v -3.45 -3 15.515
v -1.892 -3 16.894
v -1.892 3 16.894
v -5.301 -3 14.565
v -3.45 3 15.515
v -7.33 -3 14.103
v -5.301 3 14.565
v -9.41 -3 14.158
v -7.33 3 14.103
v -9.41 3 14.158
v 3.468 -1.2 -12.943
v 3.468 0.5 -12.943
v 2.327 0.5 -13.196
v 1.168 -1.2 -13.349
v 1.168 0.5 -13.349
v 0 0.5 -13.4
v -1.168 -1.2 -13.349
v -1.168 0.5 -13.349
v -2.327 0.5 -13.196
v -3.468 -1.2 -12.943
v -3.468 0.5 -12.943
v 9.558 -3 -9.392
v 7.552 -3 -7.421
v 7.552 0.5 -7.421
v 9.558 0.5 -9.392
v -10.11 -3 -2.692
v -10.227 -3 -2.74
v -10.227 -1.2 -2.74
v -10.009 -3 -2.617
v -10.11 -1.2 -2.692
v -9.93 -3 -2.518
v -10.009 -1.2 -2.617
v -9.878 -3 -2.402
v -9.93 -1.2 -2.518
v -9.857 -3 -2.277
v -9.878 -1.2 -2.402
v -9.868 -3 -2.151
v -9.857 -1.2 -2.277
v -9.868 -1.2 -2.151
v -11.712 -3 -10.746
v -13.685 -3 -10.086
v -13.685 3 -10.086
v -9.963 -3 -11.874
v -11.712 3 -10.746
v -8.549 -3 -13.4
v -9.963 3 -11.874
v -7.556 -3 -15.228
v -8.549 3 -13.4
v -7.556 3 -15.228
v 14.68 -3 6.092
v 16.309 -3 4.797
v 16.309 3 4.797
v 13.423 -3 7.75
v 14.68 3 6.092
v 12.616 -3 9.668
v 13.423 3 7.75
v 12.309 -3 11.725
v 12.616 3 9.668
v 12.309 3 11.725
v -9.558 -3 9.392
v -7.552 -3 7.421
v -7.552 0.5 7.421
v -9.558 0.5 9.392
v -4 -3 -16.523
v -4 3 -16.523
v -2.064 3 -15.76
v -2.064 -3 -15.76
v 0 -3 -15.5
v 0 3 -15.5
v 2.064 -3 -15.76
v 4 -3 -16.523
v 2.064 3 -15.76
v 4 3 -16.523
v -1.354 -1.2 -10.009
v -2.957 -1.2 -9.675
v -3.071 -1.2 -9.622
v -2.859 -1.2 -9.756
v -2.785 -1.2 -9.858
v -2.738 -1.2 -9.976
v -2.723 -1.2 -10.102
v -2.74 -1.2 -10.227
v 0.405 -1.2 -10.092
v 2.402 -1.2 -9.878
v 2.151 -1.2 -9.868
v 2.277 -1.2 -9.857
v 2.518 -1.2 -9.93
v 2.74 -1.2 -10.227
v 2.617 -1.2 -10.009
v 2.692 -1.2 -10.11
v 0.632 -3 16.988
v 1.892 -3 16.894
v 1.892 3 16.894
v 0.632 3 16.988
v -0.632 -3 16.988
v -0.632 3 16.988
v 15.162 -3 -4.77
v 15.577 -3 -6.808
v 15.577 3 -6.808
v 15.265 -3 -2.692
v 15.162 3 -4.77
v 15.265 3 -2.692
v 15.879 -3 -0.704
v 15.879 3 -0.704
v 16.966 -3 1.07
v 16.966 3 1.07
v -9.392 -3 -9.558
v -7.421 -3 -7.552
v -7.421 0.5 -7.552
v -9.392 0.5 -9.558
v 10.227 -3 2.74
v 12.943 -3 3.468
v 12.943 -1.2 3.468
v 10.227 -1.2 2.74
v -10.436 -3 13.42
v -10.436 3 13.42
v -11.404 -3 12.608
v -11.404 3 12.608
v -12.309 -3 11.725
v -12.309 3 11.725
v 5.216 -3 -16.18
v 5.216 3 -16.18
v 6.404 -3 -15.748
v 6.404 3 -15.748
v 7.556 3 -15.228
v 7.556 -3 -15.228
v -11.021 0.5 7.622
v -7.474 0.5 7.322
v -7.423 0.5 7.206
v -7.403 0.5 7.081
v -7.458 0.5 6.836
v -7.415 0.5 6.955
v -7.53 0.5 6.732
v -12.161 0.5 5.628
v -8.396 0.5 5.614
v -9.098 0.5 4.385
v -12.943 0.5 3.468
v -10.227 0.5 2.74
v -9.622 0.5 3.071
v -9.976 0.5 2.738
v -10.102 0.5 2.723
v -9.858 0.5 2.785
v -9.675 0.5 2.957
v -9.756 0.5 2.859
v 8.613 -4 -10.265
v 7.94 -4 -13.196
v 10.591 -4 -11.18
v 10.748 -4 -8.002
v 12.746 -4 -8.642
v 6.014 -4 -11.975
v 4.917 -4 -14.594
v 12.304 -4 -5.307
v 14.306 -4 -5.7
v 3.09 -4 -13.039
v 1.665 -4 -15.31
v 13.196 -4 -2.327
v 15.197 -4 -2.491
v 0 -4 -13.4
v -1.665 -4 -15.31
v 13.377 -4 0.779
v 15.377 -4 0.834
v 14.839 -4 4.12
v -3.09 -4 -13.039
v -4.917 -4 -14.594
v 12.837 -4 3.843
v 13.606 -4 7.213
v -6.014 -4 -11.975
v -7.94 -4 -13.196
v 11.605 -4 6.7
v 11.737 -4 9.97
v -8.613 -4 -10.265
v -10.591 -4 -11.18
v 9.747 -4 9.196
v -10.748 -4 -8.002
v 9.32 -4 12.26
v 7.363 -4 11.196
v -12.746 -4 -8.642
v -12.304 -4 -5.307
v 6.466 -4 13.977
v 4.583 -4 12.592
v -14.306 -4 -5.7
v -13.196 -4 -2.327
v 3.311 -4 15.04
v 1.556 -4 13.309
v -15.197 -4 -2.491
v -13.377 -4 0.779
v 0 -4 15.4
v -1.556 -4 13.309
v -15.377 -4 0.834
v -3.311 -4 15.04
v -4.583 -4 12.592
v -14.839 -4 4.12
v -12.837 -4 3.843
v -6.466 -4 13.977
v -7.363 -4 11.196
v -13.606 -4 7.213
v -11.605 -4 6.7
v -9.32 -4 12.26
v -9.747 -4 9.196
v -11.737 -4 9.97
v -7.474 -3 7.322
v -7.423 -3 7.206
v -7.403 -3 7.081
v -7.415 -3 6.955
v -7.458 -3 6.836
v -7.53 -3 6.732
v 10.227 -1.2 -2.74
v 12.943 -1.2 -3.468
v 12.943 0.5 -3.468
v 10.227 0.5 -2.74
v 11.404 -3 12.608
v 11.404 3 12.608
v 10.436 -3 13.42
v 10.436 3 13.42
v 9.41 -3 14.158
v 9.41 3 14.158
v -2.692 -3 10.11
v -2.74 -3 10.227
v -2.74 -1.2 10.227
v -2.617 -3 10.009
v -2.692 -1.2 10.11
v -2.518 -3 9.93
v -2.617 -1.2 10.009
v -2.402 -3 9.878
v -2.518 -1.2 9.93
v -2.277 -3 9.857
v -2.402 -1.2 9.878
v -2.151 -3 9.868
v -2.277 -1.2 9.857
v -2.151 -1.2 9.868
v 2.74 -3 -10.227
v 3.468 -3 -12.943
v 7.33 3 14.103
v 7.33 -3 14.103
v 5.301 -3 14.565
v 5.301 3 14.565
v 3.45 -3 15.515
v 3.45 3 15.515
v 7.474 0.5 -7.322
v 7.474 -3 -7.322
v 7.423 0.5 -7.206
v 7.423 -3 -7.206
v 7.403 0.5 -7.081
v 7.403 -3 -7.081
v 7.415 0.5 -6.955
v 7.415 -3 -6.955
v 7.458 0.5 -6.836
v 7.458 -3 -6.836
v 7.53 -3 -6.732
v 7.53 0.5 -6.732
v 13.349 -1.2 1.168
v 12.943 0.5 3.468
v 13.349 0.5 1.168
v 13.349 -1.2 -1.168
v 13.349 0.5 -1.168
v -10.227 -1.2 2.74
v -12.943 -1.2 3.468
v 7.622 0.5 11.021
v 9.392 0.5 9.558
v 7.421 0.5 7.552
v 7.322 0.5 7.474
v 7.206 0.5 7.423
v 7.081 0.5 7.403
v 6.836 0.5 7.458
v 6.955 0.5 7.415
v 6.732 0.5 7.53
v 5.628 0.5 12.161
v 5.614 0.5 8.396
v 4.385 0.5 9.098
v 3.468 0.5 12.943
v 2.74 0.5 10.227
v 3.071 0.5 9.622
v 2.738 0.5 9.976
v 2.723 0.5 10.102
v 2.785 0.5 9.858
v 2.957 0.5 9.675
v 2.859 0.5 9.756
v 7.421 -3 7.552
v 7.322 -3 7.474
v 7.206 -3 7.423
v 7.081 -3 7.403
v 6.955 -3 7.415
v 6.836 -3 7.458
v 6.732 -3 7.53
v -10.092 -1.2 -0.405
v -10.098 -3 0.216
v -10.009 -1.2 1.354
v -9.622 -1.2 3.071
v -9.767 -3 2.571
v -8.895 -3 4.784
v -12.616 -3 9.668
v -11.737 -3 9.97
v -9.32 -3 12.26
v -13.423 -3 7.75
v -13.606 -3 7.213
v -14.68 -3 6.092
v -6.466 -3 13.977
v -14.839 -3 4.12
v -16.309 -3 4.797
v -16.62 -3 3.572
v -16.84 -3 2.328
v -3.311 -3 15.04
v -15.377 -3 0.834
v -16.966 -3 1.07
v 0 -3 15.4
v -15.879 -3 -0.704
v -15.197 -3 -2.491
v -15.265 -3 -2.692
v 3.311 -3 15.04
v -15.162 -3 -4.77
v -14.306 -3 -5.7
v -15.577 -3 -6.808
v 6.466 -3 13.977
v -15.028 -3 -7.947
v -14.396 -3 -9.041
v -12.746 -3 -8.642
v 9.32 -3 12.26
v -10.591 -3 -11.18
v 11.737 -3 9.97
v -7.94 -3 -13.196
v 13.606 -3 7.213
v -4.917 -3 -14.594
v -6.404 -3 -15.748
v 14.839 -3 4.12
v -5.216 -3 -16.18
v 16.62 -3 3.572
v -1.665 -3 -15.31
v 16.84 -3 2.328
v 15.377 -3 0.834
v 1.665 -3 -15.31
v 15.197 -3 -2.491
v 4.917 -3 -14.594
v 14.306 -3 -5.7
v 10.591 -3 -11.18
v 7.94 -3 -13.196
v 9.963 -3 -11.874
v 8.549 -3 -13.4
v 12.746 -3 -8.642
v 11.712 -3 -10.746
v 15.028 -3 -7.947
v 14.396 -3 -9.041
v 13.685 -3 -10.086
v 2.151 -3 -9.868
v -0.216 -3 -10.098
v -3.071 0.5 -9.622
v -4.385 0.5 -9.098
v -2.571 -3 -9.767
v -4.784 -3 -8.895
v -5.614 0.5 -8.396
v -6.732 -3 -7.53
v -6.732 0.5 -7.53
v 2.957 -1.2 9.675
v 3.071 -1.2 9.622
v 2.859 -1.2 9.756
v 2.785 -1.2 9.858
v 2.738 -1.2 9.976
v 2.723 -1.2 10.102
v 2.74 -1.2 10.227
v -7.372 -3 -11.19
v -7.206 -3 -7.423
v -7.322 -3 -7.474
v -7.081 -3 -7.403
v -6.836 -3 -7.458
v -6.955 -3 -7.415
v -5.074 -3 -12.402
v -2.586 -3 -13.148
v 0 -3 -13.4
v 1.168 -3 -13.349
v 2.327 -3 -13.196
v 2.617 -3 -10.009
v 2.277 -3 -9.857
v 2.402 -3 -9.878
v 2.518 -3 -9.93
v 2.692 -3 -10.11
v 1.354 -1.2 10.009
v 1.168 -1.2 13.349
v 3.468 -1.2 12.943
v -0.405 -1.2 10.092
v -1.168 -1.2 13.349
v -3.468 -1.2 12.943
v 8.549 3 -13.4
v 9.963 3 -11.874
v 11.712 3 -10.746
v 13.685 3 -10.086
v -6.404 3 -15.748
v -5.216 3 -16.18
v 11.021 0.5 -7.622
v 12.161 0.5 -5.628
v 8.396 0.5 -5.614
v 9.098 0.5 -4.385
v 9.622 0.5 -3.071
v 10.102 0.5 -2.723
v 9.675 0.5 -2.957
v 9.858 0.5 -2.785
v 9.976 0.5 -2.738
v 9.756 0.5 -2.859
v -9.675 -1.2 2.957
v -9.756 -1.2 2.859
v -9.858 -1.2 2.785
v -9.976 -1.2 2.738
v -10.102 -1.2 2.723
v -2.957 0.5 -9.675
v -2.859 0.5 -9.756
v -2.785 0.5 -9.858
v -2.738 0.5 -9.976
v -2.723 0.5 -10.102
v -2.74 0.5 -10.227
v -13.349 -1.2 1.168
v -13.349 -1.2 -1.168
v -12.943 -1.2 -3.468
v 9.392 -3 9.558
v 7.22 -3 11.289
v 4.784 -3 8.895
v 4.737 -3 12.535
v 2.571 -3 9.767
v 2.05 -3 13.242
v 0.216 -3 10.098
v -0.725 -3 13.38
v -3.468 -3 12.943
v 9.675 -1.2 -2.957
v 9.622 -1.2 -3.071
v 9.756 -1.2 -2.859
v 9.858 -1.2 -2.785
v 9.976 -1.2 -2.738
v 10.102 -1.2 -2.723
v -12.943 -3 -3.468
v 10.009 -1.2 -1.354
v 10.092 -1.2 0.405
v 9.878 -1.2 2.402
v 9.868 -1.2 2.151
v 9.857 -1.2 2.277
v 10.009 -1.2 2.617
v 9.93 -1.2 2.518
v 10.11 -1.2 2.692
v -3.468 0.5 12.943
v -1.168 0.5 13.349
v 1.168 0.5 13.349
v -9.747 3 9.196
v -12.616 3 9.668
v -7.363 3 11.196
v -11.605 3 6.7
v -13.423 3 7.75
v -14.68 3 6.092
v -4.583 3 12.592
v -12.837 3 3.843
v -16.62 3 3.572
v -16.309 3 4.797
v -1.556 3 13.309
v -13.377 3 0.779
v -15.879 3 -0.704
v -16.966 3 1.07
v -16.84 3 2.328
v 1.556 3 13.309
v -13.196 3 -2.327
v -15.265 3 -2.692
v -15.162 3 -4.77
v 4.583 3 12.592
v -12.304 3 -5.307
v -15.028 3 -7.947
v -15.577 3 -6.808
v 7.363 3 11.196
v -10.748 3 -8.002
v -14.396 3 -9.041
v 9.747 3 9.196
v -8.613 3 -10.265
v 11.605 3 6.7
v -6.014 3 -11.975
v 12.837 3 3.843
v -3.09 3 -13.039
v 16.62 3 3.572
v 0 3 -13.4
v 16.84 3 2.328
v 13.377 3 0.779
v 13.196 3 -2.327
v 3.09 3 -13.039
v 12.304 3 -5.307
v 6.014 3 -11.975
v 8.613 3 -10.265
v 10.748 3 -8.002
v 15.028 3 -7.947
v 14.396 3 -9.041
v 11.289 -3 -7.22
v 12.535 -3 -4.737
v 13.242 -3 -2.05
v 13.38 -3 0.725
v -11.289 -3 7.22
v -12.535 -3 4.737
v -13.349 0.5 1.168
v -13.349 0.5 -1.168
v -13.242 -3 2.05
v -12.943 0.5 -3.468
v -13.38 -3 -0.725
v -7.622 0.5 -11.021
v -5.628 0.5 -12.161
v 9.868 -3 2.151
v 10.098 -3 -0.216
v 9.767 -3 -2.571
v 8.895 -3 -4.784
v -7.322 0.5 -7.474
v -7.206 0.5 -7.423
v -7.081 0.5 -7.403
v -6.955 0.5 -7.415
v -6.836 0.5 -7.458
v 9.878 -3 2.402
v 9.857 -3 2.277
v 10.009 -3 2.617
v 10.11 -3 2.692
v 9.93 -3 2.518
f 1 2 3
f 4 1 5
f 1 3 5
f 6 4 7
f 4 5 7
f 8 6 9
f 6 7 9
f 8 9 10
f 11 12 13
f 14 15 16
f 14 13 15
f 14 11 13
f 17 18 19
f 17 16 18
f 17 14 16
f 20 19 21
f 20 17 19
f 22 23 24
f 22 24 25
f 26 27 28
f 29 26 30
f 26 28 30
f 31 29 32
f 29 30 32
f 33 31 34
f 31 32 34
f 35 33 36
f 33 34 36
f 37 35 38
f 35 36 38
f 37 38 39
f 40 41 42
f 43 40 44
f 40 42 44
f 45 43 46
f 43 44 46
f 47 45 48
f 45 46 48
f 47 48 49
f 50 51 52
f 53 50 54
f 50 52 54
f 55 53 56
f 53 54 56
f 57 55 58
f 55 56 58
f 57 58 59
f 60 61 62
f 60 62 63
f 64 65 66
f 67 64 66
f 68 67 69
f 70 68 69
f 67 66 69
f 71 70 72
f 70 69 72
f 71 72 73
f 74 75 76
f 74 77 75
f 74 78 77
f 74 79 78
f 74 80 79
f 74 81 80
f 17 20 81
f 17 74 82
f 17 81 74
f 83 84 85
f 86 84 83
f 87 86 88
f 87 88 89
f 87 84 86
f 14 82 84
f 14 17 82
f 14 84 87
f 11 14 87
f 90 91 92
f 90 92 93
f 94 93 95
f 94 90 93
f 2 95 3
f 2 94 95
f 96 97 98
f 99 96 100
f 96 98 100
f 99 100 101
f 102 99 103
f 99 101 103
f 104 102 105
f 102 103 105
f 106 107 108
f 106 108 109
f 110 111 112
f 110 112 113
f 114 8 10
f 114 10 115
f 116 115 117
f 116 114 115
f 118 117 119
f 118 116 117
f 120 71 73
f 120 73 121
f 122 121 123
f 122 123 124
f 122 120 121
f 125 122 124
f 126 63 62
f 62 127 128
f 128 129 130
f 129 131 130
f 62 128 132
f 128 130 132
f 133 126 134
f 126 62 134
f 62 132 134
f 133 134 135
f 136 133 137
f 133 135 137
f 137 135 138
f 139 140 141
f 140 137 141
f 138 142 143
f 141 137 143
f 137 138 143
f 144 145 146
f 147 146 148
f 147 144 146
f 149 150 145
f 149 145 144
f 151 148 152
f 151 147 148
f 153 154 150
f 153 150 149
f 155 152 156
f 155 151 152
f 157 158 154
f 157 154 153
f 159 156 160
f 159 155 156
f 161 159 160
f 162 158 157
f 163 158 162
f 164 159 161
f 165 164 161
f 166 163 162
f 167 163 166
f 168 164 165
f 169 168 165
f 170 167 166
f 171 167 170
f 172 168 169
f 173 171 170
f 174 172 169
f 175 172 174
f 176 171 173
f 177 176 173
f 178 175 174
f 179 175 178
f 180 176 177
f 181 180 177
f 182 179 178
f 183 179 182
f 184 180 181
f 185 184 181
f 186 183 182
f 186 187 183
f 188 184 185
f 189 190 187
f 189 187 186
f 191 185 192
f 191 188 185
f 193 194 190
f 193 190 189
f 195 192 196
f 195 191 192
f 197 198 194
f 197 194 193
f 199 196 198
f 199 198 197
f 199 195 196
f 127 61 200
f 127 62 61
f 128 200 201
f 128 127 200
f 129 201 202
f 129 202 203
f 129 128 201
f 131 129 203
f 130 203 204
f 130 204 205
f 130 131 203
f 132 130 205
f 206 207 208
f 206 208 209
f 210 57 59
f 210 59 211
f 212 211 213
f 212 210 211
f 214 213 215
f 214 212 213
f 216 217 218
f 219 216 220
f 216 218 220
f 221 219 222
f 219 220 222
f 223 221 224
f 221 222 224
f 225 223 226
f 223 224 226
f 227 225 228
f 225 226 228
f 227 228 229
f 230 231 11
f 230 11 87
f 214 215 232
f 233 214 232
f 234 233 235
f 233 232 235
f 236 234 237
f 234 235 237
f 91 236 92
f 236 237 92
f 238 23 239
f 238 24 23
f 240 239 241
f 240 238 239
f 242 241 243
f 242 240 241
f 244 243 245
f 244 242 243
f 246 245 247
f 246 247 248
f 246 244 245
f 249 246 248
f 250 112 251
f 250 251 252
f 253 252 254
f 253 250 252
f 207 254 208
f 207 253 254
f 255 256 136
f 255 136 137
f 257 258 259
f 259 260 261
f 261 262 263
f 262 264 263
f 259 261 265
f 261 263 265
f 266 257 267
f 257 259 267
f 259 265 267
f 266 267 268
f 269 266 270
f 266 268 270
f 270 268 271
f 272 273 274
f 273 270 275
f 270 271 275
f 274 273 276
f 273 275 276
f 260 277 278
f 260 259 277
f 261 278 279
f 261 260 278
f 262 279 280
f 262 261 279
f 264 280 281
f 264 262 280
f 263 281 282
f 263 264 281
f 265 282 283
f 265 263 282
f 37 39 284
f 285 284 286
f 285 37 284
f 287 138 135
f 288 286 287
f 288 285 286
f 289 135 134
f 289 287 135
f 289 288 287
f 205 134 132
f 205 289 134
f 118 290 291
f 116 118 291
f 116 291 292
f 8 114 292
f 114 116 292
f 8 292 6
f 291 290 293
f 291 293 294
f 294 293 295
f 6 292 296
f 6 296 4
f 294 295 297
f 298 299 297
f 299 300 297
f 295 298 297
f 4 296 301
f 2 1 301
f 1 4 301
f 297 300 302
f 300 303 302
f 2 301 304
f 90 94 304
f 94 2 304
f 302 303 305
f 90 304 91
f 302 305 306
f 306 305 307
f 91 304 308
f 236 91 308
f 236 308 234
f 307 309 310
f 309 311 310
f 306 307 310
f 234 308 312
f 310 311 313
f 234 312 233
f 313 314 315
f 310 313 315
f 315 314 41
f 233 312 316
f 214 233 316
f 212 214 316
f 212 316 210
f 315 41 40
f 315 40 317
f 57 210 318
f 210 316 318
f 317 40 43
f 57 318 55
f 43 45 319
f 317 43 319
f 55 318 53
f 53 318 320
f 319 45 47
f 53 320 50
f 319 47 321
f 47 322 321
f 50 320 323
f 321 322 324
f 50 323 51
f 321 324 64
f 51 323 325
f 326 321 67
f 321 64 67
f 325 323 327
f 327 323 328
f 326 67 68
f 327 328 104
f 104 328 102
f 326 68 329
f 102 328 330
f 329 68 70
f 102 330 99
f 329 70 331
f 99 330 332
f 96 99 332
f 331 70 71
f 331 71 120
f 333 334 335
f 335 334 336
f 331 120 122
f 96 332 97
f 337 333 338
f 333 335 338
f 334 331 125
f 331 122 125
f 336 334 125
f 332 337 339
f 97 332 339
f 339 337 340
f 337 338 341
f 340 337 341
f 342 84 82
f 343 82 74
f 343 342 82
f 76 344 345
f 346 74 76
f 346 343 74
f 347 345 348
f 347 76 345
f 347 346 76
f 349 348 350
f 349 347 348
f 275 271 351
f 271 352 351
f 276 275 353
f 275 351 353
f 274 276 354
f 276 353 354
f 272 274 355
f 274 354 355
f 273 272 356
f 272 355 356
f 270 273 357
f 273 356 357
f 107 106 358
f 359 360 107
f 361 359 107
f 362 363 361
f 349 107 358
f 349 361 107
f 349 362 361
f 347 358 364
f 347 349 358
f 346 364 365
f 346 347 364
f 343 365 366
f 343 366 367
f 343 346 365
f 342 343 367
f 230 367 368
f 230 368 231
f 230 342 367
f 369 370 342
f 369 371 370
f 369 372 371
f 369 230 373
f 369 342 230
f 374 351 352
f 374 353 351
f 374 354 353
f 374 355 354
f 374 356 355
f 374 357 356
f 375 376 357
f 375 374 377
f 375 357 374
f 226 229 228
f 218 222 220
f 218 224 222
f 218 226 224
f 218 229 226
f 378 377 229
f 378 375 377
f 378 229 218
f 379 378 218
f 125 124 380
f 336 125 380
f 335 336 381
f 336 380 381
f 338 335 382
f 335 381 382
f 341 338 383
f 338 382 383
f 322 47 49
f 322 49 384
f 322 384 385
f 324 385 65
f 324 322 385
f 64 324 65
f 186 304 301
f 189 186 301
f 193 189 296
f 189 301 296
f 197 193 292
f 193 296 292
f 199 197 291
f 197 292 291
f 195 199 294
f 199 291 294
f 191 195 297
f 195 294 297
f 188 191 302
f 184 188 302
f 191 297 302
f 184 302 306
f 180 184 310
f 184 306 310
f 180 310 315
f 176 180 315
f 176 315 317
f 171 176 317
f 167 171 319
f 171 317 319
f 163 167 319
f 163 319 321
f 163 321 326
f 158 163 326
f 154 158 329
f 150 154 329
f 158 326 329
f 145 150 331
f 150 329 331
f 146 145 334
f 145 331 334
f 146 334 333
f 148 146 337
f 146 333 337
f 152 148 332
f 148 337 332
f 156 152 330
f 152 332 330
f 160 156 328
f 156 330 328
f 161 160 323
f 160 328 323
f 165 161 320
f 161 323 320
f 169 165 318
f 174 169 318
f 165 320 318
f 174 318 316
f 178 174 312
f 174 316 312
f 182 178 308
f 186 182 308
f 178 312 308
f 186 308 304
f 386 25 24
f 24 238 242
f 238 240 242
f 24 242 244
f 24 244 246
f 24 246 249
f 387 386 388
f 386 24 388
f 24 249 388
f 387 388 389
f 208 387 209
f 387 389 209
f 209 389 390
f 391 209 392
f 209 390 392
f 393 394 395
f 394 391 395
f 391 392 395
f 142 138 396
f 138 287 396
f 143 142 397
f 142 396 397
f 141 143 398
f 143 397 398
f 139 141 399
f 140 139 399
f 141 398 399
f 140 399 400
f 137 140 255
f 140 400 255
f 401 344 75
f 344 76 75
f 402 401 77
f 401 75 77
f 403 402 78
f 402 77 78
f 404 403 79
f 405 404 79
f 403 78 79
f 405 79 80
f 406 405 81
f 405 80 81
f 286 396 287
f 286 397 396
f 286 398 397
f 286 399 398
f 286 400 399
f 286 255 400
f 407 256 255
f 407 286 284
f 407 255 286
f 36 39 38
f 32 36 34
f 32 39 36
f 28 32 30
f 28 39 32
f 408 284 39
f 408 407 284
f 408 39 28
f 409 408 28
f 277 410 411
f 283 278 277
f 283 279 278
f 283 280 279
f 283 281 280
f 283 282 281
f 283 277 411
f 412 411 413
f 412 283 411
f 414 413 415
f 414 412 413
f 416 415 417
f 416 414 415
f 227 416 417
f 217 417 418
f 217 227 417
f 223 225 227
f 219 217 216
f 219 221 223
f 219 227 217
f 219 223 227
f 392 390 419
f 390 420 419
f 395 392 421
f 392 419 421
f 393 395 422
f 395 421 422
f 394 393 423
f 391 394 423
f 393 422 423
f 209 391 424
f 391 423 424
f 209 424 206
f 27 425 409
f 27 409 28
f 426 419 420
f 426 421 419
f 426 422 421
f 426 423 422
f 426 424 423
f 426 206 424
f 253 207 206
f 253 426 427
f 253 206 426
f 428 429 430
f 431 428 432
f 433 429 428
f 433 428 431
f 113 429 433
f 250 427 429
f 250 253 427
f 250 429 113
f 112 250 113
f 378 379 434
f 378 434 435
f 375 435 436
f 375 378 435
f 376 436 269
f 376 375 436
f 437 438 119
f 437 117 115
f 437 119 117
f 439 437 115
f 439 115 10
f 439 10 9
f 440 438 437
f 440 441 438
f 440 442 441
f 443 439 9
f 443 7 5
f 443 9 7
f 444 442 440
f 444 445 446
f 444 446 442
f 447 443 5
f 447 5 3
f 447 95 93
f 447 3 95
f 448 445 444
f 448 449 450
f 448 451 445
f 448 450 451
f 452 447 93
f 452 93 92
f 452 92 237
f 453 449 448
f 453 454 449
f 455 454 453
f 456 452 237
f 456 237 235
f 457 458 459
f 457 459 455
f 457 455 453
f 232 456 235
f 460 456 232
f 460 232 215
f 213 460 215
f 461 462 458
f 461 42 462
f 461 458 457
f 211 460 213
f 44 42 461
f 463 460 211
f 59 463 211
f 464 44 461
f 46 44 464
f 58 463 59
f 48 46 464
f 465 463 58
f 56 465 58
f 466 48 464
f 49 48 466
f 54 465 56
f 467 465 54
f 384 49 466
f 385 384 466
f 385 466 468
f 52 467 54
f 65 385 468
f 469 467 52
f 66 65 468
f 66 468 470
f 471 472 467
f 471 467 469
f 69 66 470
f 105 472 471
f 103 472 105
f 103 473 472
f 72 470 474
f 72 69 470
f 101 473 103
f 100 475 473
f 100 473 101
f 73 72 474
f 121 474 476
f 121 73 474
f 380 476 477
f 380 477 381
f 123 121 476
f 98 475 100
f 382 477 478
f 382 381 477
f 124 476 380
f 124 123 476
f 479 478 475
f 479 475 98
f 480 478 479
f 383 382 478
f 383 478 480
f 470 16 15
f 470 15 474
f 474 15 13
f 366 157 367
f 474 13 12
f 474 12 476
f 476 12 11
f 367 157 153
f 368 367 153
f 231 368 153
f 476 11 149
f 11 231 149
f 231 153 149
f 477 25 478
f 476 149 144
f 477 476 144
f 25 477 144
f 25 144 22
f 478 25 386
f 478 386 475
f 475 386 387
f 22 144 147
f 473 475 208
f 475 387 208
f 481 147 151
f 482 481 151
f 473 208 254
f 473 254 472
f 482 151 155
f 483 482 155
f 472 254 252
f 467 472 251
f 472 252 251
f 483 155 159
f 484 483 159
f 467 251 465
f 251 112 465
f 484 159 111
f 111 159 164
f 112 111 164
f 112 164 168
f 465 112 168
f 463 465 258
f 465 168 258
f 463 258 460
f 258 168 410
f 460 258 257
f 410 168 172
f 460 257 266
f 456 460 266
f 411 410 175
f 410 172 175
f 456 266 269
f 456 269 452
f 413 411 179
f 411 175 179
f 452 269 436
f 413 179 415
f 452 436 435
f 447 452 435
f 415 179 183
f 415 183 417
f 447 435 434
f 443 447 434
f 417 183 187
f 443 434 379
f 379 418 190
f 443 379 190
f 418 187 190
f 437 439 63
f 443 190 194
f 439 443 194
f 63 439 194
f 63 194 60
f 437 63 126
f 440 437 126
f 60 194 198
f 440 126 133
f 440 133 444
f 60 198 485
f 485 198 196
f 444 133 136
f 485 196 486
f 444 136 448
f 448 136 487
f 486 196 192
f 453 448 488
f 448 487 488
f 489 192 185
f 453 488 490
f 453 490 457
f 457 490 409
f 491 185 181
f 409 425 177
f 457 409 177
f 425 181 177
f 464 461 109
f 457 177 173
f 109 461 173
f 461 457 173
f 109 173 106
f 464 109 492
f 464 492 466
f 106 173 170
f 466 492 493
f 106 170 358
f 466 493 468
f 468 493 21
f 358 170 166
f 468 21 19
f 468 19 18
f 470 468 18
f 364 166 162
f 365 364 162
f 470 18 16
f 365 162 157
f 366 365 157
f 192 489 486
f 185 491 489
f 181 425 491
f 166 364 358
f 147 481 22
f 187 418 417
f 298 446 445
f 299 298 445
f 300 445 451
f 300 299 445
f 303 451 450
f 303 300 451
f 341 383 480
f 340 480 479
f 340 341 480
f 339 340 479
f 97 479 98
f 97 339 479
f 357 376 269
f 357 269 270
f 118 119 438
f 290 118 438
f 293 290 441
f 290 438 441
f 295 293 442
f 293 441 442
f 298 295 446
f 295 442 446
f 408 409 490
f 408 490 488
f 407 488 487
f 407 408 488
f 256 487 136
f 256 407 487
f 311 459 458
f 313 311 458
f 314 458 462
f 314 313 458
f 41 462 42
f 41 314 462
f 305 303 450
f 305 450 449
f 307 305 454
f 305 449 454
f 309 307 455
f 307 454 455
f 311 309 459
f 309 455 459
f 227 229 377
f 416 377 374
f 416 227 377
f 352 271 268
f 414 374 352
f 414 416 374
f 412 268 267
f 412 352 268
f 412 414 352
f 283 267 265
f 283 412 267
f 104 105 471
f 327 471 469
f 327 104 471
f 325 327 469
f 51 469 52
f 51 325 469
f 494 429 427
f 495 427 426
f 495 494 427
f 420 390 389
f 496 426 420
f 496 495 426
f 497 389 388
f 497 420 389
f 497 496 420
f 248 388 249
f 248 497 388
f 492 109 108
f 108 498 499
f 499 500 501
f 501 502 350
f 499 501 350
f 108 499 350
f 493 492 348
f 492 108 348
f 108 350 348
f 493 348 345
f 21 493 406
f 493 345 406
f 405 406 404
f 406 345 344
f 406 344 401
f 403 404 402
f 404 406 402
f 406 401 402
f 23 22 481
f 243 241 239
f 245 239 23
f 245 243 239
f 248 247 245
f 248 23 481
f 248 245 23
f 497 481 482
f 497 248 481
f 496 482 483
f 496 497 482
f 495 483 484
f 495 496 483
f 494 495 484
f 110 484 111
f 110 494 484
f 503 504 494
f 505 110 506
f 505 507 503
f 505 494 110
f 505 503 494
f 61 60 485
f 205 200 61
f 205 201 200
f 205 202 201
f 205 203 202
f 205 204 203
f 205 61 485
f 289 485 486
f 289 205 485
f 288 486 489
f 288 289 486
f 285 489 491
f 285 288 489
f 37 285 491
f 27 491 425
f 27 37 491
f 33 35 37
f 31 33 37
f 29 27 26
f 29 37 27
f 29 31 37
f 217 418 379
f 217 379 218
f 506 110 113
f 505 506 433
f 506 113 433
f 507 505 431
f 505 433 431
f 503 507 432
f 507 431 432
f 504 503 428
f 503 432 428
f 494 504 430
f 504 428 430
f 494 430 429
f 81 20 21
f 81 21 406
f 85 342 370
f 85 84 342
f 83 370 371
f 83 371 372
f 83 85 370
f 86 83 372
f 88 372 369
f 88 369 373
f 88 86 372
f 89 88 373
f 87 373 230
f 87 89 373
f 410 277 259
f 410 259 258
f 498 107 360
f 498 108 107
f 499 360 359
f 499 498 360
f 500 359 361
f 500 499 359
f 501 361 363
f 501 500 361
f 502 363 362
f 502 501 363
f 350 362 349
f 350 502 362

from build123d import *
from build123d.topology import SkipClean

# Parameters (mm, degrees)
EXTRUDE_1_DEPTH                  = 3
SKETCH_3_R                       = 15.4
EXTRUDE_2_DEPTH                  = 1
SKETCH_4_R                       = 13.4
CUT_EXTRUDE_1_DEPTH              = 68.538877693
EXTRUDE_3_DEPTH                  = 3.5
CUT_EXTRUDE_START                = -1.7
CUT_EXTRUDE_2_DEPTH              = 1.7
FILLET_1_R                       = 0.5
PATTERN_CIRCULAR_1_COUNT         = 4
FILLET_1_OF_PATTERN_CIRCULAR_1_R = 0.5
HOLE_WIZARD_M2_1_D               = 2.4
HOLE_WIZARD_M2_1_CBORE_D         = 5
HOLE_WIZARD_M2_1_CBORE_DEPTH     = 1.6
HOLE_WIZARD_M2_2_D               = 2.4
HOLE_WIZARD_M2_2_CBORE_D         = 5
HOLE_WIZARD_M2_2_CBORE_DEPTH     = 1.6
HOLE_WIZARD_M2_1_2_D             = 1.6
FILLET_2_R                       = 3
CUT_EXTRUDE_START_2              = -1.6
SKETCH_15_R                      = 2.5
CUT_EXTRUDE_4_DEPTH              = 1.6
SKETCH_16_W                      = 105
SKETCH_16_H                      = 105
SKETCH_16_R                      = 17
CUT_EXTRUDE_5_DEPTH              = 68.44256816
SKETCH_17_R                      = 8.333697596
CUT_EXTRUDE_6_DEPTH              = 10
PATTERN_CIRCULAR_2_COUNT         = 9


with BuildPart() as part:
    # ｽｹｯﾁ2 → ﾎﾞｽ - 押し出し1 (new, symmetric)
    with BuildSketch(Plane(origin=(0, 0, 0), x_dir=(1, 0, 0), z_dir=(0, 1, 0))):
        with BuildLine():
            ThreePointArc((-13.5, 23.382685902), (-18.457166085, 19.706167058), (-22.449944321, 15))
            Line((-22.449944321, 15), (-13.5, 15))
            Line((-13.5, 15), (-13.5, 23.382685902))
        make_face()
        with BuildLine():
            Line((13.5, 15), (22.449944321, 15))
            ThreePointArc((22.449944321, 15), (18.457166085, 19.706167058), (13.5, 23.382685902))
            Line((13.5, 23.382685902), (13.5, 15))
        make_face()
        with BuildLine():
            Line((-47.5, 0), (-27, 0))
            ThreePointArc((-27, 0), (0, -27), (27, 0))
            Line((27, 0), (47.5, 0))
            Line((47.5, 0), (47.5, 15))
            Line((47.5, 15), (22.449944321, 15))
            Line((22.449944321, 15), (13.5, 15))
            Line((13.5, 15), (13.5, 23.382685902))
            ThreePointArc((13.5, 23.382685902), (0, 27), (-13.5, 23.382685902))
            Line((-13.5, 23.382685902), (-13.5, 15))
            Line((-13.5, 15), (-22.449944321, 15))
            Line((-22.449944321, 15), (-47.5, 15))
            Line((-47.5, 15), (-47.5, 0))
        make_face()
        with BuildLine():
            Line((-13.5, 47.5), (-13.5, 23.382685902))
            ThreePointArc((-13.5, 23.382685902), (0, 27), (13.5, 23.382685902))
            Line((13.5, 23.382685902), (13.5, 47.5))
            Line((13.5, 47.5), (-13.5, 47.5))
        make_face()
    extrude(amount=EXTRUDE_1_DEPTH, both=True)

    # ｽｹｯﾁ3 → ﾎﾞｽ - 押し出し2 (add)
    with BuildSketch(Plane.XZ.offset(3)):
        with Locations(Location((0, 0, 0), (0, 0, 90))):
            Circle(SKETCH_3_R)
    extrude(amount=EXTRUDE_2_DEPTH)

    # ｽｹｯﾁ4 → ｶｯﾄ - 押し出し1 (cut, through all)
    with BuildSketch(Plane.XZ.offset(4)):
        with Locations(Location((0, 0, 0), (0, 0, 270))):
            Circle(SKETCH_4_R)
    extrude(amount=-CUT_EXTRUDE_1_DEPTH, mode=Mode.SUBTRACT)

    # ｽｹｯﾁ5 → ﾎﾞｽ - 押し出し3 (add)
    with BuildSketch(Plane.XZ.offset(3)):
        with BuildLine():
            Line((-7.079183569, -7.203829536), (-9.392184142, -9.557556019))
            ThreePointArc((-9.392184142, -9.557556019), (-3.411666106, -12.958415581), (3.468175204, -12.943406072))
            Line((3.468175204, -12.943406072), (2.614072356, -9.755850846))
            ThreePointArc((2.614072356, -9.755850846), (-2.571479677, -9.767163983), (-7.079183569, -7.203829536))
        make_face()
    extrude_3 = extrude(amount=-EXTRUDE_3_DEPTH)

    # ｽｹｯﾁ6 → ｶｯﾄ - 押し出し2 (cut)
    with SkipClean():  # the faces are left unmerged after this step: merging them gives an invalid solid
        with BuildSketch(Plane(origin=(0, 0.5, 0), x_dir=(1, 0, 0), z_dir=(0, 1, 0)).offset(CUT_EXTRUDE_START)):
            with BuildLine():
                Line((-3.468175204, 12.943406072), (0, 0))
                Line((0, 0), (3.468175204, 12.943406072))
                ThreePointArc((3.468175204, 12.943406072), (0, 13.4), (-3.468175204, 12.943406072))
            make_face()
        cut_extrude_2 = extrude(amount=CUT_EXTRUDE_2_DEPTH, mode=Mode.SUBTRACT)

    # ﾌｨﾚｯﾄ1
    fillet_1_edges = [part.edges().sort_by_distance(p)[0] for p in [
        (-7.079183569, -1.25, -7.203829536),
        (2.614072356, -2.1, -9.755850846),
        (-2.614072356, -0.35, -9.755850846),
    ]]
    fillet(fillet_1_edges, radius=FILLET_1_R)

    # 円形ﾊﾟﾀｰﾝ1: ﾎﾞｽ - 押し出し3, ｶｯﾄ - 押し出し2 ×4 about axis
    with SkipClean():  # the faces are left unmerged after this step: merging them gives an invalid solid
        pattern_circular_1_axis = Axis((0, 0, 0), (0, 1, 0))
        add([extrude_3.rotate(pattern_circular_1_axis, i * 360 / PATTERN_CIRCULAR_1_COUNT) for i in range(1, PATTERN_CIRCULAR_1_COUNT)])
        add([cut_extrude_2.rotate(pattern_circular_1_axis, i * 360 / PATTERN_CIRCULAR_1_COUNT) for i in range(1, PATTERN_CIRCULAR_1_COUNT)], mode=Mode.SUBTRACT)

    # ﾌｨﾚｯﾄ1 of 円形ﾊﾟﾀｰﾝ1
    fillet_1_of_pattern_circular_1_edges = [part.edges().sort_by_distance(p)[0] for p in [
        (-7.203829536, -1.25, 7.079183569),
        (-9.755850846, -2.1, -2.614072356),
        (-9.755850846, -0.35, 2.614072356),
        (7.079183569, -1.25, 7.203829536),
        (-2.614072356, -2.1, 9.755850846),
        (2.614072356, -0.35, 9.755850846),
        (7.203829536, -1.25, -7.079183569),
        (9.755850846, -2.1, 2.614072356),
        (9.755850846, -0.35, -2.614072356),
    ]]
    fillet(fillet_1_of_pattern_circular_1_edges, radius=FILLET_1_OF_PATTERN_CIRCULAR_1_R)

    # Hole Wizard M2 _1 (through all)
    with Locations(Plane(origin=(0, 3, 0), x_dir=(1, 0, 0), z_dir=(0, 1, 0))):
        with Locations((-10.5, -22.5), (-22.5, -10.5)):
            hole_wizard_m2_1 = CounterBoreHole(HOLE_WIZARD_M2_1_D / 2, HOLE_WIZARD_M2_1_CBORE_D / 2, HOLE_WIZARD_M2_1_CBORE_DEPTH)

    # M2 なべ頭ねじ用座ぐり穴2 (through all)
    with Locations(Plane(origin=(0, -3, 0), x_dir=(-1, 0, 0), z_dir=(0, -1, 0))):
        with Locations((10.5, 21), (10.5, 42), (22.5, 10.5)):
            hole_wizard_m2_2 = CounterBoreHole(HOLE_WIZARD_M2_2_D / 2, HOLE_WIZARD_M2_2_CBORE_D / 2, HOLE_WIZARD_M2_2_CBORE_DEPTH)

    # Hole Wizard M2 _1 2 (through all)
    with Locations(Plane(origin=(0, -3, 0), x_dir=(-1, 0, 0), z_dir=(0, -1, 0))):
        with Locations((43.5, 12), (10.5, 43.5)):
            hole_wizard_m2_1_2 = Hole(HOLE_WIZARD_M2_1_2_D / 2)

    # ﾐﾗｰ1: Hole Wizard M2 _1, M2 なべ頭ねじ用座ぐり穴2, Hole Wizard M2 _1 2 across plane
    with SkipClean():  # the faces are left unmerged after this step: merging them gives an invalid solid
        add(hole_wizard_m2_1.mirror(Plane(origin=(0, 0, 0), x_dir=(0, 0, 1), z_dir=(1, 0, 0))), mode=Mode.SUBTRACT)
        add(hole_wizard_m2_2.mirror(Plane(origin=(0, 0, 0), x_dir=(0, 0, 1), z_dir=(1, 0, 0))), mode=Mode.SUBTRACT)
        add(hole_wizard_m2_1_2.mirror(Plane(origin=(0, 0, 0), x_dir=(0, 0, 1), z_dir=(1, 0, 0))), mode=Mode.SUBTRACT)

    # ﾌｨﾚｯﾄ2
    fillet_2_edges = [part.edges().sort_by_distance(p)[0] for p in [
        (47.5, 0, -15),
        (47.5, 0, 0),
        (27, 0, 0),
        (-27, 0, 0),
        (-47.5, 0, 0),
        (-47.5, 0, -15),
        (-22.449944321, 0, -15),
        (-13.5, 0, -23.382685902),
        (-13.5, 0, -47.5),
        (13.5, 0, -47.5),
        (13.5, 0, -23.382685902),
        (22.449944321, 0, -15),
    ]]
    fillet(fillet_2_edges, radius=FILLET_2_R)

    # ｽｹｯﾁ15 → ｶｯﾄ - 押し出し4 (cut)
    with SkipClean():  # the faces are left unmerged after this step: merging them gives an invalid solid
        with BuildSketch(Plane.XZ.offset(3).offset(CUT_EXTRUDE_START_2)):
            with Locations((-22.5, 10.5)):
                Circle(SKETCH_15_R)
            with Locations((22.5, 10.5)):
                Circle(SKETCH_15_R)
        extrude(amount=CUT_EXTRUDE_4_DEPTH, mode=Mode.SUBTRACT)

    # ｽｹｯﾁ16 → ｶｯﾄ - 押し出し5 (cut, through all)
    with SkipClean():  # the faces are left unmerged after this step: merging them gives an invalid solid
        with BuildSketch(Plane.XZ.offset(3)):
            Rectangle(SKETCH_16_W, SKETCH_16_H)
            with Locations(Location((0, 0, 0), (0, 0, 270))):
                Circle(SKETCH_16_R, mode=Mode.SUBTRACT)
        extrude(amount=-CUT_EXTRUDE_5_DEPTH, mode=Mode.SUBTRACT)

    # ｽｹｯﾁ17 → ｶｯﾄ - 押し出し6 (cut)
    with SkipClean():  # the faces are left unmerged after this step: merging them gives an invalid solid
        with BuildSketch(Plane(origin=(0, 3, 0), x_dir=(1, 0, 0), z_dir=(0, 1, 0))):
            with Locations((0, 23.833697596)):
                Circle(SKETCH_17_R)
        cut_extrude_6 = extrude(amount=-CUT_EXTRUDE_6_DEPTH, mode=Mode.SUBTRACT)

    # 円形ﾊﾟﾀｰﾝ2: ｶｯﾄ - 押し出し6 ×9 about axis
    with SkipClean():  # the faces are left unmerged after this step: merging them gives an invalid solid
        pattern_circular_2_axis = Axis((0, 0, 0), (0, 1, 0))
        for i in range(1, PATTERN_CIRCULAR_2_COUNT):
            add(cut_extrude_6.rotate(pattern_circular_2_axis, i * 360 / PATTERN_CIRCULAR_2_COUNT), mode=Mode.SUBTRACT)


solid = part.part
